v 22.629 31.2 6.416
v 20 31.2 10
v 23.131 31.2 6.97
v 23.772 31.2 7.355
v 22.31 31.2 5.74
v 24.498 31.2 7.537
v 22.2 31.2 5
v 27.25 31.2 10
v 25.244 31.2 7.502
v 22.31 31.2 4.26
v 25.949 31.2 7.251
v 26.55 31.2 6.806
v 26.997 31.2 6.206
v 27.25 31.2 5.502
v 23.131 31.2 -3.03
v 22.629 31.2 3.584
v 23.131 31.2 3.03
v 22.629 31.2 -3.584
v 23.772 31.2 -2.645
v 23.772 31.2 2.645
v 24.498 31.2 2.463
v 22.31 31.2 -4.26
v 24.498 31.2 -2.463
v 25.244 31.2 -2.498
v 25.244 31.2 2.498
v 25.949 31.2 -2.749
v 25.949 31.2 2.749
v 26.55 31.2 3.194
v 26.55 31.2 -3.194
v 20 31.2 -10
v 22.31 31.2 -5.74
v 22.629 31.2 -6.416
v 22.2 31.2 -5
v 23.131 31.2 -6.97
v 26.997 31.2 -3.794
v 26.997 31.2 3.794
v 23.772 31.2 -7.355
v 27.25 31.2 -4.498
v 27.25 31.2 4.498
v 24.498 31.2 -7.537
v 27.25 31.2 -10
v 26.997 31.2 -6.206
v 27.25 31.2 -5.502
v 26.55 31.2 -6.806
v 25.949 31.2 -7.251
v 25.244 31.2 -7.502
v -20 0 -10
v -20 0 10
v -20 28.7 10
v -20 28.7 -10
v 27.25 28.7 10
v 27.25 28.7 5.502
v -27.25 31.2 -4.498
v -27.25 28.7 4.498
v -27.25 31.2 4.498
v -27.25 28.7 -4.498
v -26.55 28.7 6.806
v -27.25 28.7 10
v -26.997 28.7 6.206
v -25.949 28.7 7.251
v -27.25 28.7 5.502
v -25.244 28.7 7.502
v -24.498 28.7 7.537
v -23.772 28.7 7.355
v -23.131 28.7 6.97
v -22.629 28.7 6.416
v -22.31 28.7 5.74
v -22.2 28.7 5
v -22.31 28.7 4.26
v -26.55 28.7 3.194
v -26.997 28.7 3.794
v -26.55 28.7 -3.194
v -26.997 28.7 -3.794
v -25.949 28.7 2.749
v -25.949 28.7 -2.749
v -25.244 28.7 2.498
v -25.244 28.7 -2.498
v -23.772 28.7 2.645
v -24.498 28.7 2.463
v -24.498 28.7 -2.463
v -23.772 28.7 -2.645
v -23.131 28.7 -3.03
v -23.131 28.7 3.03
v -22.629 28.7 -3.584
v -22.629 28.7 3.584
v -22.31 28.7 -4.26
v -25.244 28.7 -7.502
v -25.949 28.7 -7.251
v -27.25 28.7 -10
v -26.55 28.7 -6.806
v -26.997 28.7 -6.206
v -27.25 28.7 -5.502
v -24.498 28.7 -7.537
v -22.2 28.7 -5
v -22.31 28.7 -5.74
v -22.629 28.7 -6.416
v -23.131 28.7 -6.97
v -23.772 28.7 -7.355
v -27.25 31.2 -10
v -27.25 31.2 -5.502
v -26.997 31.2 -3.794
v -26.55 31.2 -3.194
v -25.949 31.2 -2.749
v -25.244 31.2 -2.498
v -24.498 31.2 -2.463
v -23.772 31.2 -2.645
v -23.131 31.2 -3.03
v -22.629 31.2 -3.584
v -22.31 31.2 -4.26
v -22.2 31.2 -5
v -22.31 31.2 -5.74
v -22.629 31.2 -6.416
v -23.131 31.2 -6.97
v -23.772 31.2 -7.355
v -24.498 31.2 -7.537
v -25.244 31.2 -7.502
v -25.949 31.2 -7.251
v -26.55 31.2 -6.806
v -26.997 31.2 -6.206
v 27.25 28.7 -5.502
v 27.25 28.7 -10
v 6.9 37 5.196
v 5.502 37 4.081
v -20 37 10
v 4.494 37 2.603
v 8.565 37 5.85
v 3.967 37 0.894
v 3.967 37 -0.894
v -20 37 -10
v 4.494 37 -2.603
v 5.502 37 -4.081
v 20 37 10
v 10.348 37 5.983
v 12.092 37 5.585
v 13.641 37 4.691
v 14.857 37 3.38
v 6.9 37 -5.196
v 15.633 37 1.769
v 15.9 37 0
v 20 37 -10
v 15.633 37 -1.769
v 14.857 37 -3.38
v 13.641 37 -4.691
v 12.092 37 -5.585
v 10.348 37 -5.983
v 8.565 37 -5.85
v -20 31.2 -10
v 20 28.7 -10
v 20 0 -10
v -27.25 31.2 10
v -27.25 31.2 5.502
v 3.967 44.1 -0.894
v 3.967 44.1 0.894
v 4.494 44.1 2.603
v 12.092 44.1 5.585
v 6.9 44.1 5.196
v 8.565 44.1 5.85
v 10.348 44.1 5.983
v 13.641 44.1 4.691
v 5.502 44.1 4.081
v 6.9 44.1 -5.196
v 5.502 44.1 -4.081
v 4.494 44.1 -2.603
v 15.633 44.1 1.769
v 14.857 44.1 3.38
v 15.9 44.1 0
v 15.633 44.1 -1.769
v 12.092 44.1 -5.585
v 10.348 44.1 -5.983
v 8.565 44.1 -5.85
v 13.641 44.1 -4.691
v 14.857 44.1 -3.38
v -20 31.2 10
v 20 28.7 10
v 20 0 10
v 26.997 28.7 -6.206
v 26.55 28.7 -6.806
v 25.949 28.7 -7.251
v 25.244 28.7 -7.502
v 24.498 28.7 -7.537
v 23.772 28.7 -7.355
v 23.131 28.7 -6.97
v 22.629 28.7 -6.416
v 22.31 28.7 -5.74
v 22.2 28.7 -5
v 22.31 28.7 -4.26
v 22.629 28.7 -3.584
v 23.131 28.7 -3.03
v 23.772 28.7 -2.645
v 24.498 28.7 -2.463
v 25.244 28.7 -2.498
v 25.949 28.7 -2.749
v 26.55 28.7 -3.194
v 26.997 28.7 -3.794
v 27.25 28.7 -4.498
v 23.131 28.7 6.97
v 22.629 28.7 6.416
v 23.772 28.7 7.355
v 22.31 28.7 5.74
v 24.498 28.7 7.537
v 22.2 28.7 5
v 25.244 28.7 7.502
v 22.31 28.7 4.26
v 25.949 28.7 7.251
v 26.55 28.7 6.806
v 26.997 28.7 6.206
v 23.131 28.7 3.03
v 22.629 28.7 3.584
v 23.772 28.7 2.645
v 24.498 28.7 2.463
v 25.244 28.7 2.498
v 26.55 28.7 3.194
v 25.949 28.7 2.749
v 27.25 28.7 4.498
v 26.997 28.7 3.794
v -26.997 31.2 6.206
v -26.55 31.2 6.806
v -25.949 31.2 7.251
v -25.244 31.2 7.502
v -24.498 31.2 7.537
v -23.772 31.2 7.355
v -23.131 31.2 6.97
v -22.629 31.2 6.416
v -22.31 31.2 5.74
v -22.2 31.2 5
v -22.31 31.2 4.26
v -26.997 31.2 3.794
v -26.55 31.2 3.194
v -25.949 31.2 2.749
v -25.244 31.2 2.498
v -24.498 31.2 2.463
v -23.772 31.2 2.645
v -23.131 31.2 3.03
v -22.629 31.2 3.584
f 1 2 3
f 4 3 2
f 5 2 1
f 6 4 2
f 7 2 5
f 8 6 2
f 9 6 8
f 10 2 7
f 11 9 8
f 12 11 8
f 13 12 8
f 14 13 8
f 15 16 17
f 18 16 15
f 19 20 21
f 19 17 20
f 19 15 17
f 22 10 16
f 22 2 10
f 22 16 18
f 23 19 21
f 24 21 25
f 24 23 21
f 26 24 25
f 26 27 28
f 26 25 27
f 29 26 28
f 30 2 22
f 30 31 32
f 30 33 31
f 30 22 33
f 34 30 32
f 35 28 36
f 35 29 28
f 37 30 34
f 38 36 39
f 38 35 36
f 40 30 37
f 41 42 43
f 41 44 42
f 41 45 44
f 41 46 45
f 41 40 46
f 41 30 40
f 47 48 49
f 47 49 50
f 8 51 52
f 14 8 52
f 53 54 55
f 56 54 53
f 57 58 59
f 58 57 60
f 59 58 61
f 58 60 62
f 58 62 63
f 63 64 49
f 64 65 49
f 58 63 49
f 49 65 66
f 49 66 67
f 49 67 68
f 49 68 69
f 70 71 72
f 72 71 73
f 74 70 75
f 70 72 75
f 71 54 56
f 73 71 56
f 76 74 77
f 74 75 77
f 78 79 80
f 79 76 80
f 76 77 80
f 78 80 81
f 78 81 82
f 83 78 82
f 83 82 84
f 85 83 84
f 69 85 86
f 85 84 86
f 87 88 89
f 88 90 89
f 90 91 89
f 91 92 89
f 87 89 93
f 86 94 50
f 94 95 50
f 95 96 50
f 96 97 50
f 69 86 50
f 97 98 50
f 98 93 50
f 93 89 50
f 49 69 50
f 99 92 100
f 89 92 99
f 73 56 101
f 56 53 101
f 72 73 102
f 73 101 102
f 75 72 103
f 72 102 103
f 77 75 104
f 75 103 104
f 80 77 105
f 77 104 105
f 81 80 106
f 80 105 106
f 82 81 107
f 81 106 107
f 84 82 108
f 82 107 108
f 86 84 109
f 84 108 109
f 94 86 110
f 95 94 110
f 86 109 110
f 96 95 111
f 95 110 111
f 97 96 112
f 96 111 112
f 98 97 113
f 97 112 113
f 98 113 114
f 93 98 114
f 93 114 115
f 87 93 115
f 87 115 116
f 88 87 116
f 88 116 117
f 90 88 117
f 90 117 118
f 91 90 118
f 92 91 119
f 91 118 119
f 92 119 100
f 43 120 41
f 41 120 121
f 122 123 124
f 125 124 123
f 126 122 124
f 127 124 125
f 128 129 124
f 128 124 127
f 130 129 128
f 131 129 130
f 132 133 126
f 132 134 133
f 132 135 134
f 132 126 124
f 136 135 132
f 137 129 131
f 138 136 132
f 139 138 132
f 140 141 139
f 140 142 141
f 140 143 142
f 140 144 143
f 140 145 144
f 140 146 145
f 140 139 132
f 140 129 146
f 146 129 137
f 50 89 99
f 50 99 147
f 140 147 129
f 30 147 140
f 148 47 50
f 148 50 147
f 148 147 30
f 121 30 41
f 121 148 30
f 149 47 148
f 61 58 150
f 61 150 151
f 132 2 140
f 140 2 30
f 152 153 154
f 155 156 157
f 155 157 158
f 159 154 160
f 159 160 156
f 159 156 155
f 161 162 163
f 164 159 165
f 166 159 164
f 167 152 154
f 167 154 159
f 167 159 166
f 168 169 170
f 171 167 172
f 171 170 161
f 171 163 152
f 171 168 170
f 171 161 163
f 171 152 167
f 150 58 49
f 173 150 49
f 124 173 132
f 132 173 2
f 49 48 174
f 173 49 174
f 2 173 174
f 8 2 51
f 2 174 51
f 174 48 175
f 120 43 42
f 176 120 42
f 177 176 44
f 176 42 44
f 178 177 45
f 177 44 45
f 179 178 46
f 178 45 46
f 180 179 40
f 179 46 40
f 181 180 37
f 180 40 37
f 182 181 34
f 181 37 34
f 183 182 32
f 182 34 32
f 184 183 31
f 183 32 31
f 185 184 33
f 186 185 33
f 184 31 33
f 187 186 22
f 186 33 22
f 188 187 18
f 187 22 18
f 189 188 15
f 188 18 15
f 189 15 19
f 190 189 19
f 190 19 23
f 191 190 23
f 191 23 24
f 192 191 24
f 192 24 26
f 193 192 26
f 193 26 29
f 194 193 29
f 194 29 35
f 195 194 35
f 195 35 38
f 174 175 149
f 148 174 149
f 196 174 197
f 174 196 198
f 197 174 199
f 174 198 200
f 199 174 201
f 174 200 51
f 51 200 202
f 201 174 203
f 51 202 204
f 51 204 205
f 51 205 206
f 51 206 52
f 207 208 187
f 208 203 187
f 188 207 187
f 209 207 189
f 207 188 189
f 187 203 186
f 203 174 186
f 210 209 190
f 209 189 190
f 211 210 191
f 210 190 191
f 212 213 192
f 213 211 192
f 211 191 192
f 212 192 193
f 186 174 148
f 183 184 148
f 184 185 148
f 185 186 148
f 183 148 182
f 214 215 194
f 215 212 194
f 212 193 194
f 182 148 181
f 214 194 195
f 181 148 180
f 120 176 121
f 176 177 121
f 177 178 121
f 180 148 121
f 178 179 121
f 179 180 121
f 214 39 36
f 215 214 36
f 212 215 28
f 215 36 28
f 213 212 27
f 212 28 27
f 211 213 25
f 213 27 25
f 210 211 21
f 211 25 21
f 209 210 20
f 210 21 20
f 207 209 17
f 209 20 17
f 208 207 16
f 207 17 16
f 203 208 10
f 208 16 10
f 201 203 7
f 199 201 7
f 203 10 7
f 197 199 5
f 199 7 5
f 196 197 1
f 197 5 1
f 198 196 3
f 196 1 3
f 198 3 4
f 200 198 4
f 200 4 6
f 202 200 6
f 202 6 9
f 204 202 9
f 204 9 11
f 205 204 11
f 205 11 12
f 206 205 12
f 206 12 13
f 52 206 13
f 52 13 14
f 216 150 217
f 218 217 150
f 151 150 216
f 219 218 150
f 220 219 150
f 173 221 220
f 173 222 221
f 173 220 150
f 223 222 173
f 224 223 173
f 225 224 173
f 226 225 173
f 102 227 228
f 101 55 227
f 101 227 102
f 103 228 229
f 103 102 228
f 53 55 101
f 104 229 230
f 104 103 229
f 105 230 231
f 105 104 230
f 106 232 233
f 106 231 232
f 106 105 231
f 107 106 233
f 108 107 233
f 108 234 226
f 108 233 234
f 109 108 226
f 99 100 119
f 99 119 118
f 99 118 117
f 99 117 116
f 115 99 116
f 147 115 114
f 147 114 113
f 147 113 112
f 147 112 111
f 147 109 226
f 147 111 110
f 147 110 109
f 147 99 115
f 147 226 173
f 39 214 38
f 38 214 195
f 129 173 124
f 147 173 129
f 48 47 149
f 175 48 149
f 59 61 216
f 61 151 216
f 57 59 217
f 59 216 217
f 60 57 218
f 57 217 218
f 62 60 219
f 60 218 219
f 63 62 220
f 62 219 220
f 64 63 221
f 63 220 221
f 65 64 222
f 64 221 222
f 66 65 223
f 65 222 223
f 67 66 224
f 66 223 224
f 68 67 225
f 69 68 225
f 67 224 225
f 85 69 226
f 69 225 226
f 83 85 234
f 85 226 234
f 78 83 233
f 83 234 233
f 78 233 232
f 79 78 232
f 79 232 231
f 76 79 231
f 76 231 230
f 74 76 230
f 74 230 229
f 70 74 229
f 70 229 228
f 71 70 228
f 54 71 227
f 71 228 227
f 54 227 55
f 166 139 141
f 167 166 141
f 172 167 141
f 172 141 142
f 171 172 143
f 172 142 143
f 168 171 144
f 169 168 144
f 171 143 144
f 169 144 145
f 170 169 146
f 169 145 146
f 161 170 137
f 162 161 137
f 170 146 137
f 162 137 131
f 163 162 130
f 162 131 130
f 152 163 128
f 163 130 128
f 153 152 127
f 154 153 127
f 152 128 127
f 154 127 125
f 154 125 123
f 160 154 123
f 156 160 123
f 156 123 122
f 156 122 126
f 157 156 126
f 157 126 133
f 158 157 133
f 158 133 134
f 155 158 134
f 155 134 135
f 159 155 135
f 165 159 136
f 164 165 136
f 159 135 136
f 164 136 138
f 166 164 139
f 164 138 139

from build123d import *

# Parameters (mm, degrees)
SKETCH1_W           = 40
SKETCH1_H           = 20
BOSS_EXTRUDE1_DEPTH = 28.7
SKETCH2_W           = 54.5
SKETCH2_H           = 20
BOSS_EXTRUDE2_DEPTH = 2.5
SKETCH3_W           = 40
SKETCH3_H           = 20
BOSS_EXTRUDE3_DEPTH = 5.8
SKETCH4_R           = 6
BOSS_EXTRUDE4_DEPTH = 7.1
SKETCH5_R           = 2.55
CUT_EXTRUDE3_DEPTH  = 7.1


with BuildPart() as part:
    # Sketch1 → Boss-Extrude1 (new body)
    with BuildSketch(Plane(origin=(0, 0, 0), x_dir=(1, 0, 0), z_dir=(0, 1, 0))):
        Rectangle(SKETCH1_W, SKETCH1_H)
    extrude(amount=BOSS_EXTRUDE1_DEPTH)

    # Sketch2 → Boss-Extrude2 (add)
    with BuildSketch(Plane(origin=(0, 28.7, 0), x_dir=(1, 0, 0), z_dir=(0, 1, 0))):
        Rectangle(SKETCH2_W, SKETCH2_H)
    extrude(amount=BOSS_EXTRUDE2_DEPTH)

    # Sketch3 → Boss-Extrude3 (add)
    with BuildSketch(Plane(origin=(0, 31.2, 0), x_dir=(1, 0, 0), z_dir=(0, 1, 0))):
        Rectangle(SKETCH3_W, SKETCH3_H)
    extrude(amount=BOSS_EXTRUDE3_DEPTH)

    # Sketch4 → Boss-Extrude4 (add)
    with BuildSketch(Plane(origin=(0, 37, 0), x_dir=(1, 0, 0), z_dir=(0, 1, 0))):
        with Locations((9.9, 0)):
            Circle(SKETCH4_R)
    extrude(amount=BOSS_EXTRUDE4_DEPTH)

    # Sketch5 → Cut-Extrude3 (cut)
    with BuildSketch(Plane(origin=(0, 31.2, 0), x_dir=(1, 0, 0), z_dir=(0, 1, 0))):
        with Locations((-24.75, 5)):
            Circle(SKETCH5_R)
        with Locations((-24.75, -5)):
            Circle(SKETCH5_R)
        with Locations((24.75, -5)):
            Circle(SKETCH5_R)
        with Locations((24.75, 5)):
            Circle(SKETCH5_R)
    extrude(amount=-CUT_EXTRUDE3_DEPTH, mode=Mode.SUBTRACT)


solid = part.part
